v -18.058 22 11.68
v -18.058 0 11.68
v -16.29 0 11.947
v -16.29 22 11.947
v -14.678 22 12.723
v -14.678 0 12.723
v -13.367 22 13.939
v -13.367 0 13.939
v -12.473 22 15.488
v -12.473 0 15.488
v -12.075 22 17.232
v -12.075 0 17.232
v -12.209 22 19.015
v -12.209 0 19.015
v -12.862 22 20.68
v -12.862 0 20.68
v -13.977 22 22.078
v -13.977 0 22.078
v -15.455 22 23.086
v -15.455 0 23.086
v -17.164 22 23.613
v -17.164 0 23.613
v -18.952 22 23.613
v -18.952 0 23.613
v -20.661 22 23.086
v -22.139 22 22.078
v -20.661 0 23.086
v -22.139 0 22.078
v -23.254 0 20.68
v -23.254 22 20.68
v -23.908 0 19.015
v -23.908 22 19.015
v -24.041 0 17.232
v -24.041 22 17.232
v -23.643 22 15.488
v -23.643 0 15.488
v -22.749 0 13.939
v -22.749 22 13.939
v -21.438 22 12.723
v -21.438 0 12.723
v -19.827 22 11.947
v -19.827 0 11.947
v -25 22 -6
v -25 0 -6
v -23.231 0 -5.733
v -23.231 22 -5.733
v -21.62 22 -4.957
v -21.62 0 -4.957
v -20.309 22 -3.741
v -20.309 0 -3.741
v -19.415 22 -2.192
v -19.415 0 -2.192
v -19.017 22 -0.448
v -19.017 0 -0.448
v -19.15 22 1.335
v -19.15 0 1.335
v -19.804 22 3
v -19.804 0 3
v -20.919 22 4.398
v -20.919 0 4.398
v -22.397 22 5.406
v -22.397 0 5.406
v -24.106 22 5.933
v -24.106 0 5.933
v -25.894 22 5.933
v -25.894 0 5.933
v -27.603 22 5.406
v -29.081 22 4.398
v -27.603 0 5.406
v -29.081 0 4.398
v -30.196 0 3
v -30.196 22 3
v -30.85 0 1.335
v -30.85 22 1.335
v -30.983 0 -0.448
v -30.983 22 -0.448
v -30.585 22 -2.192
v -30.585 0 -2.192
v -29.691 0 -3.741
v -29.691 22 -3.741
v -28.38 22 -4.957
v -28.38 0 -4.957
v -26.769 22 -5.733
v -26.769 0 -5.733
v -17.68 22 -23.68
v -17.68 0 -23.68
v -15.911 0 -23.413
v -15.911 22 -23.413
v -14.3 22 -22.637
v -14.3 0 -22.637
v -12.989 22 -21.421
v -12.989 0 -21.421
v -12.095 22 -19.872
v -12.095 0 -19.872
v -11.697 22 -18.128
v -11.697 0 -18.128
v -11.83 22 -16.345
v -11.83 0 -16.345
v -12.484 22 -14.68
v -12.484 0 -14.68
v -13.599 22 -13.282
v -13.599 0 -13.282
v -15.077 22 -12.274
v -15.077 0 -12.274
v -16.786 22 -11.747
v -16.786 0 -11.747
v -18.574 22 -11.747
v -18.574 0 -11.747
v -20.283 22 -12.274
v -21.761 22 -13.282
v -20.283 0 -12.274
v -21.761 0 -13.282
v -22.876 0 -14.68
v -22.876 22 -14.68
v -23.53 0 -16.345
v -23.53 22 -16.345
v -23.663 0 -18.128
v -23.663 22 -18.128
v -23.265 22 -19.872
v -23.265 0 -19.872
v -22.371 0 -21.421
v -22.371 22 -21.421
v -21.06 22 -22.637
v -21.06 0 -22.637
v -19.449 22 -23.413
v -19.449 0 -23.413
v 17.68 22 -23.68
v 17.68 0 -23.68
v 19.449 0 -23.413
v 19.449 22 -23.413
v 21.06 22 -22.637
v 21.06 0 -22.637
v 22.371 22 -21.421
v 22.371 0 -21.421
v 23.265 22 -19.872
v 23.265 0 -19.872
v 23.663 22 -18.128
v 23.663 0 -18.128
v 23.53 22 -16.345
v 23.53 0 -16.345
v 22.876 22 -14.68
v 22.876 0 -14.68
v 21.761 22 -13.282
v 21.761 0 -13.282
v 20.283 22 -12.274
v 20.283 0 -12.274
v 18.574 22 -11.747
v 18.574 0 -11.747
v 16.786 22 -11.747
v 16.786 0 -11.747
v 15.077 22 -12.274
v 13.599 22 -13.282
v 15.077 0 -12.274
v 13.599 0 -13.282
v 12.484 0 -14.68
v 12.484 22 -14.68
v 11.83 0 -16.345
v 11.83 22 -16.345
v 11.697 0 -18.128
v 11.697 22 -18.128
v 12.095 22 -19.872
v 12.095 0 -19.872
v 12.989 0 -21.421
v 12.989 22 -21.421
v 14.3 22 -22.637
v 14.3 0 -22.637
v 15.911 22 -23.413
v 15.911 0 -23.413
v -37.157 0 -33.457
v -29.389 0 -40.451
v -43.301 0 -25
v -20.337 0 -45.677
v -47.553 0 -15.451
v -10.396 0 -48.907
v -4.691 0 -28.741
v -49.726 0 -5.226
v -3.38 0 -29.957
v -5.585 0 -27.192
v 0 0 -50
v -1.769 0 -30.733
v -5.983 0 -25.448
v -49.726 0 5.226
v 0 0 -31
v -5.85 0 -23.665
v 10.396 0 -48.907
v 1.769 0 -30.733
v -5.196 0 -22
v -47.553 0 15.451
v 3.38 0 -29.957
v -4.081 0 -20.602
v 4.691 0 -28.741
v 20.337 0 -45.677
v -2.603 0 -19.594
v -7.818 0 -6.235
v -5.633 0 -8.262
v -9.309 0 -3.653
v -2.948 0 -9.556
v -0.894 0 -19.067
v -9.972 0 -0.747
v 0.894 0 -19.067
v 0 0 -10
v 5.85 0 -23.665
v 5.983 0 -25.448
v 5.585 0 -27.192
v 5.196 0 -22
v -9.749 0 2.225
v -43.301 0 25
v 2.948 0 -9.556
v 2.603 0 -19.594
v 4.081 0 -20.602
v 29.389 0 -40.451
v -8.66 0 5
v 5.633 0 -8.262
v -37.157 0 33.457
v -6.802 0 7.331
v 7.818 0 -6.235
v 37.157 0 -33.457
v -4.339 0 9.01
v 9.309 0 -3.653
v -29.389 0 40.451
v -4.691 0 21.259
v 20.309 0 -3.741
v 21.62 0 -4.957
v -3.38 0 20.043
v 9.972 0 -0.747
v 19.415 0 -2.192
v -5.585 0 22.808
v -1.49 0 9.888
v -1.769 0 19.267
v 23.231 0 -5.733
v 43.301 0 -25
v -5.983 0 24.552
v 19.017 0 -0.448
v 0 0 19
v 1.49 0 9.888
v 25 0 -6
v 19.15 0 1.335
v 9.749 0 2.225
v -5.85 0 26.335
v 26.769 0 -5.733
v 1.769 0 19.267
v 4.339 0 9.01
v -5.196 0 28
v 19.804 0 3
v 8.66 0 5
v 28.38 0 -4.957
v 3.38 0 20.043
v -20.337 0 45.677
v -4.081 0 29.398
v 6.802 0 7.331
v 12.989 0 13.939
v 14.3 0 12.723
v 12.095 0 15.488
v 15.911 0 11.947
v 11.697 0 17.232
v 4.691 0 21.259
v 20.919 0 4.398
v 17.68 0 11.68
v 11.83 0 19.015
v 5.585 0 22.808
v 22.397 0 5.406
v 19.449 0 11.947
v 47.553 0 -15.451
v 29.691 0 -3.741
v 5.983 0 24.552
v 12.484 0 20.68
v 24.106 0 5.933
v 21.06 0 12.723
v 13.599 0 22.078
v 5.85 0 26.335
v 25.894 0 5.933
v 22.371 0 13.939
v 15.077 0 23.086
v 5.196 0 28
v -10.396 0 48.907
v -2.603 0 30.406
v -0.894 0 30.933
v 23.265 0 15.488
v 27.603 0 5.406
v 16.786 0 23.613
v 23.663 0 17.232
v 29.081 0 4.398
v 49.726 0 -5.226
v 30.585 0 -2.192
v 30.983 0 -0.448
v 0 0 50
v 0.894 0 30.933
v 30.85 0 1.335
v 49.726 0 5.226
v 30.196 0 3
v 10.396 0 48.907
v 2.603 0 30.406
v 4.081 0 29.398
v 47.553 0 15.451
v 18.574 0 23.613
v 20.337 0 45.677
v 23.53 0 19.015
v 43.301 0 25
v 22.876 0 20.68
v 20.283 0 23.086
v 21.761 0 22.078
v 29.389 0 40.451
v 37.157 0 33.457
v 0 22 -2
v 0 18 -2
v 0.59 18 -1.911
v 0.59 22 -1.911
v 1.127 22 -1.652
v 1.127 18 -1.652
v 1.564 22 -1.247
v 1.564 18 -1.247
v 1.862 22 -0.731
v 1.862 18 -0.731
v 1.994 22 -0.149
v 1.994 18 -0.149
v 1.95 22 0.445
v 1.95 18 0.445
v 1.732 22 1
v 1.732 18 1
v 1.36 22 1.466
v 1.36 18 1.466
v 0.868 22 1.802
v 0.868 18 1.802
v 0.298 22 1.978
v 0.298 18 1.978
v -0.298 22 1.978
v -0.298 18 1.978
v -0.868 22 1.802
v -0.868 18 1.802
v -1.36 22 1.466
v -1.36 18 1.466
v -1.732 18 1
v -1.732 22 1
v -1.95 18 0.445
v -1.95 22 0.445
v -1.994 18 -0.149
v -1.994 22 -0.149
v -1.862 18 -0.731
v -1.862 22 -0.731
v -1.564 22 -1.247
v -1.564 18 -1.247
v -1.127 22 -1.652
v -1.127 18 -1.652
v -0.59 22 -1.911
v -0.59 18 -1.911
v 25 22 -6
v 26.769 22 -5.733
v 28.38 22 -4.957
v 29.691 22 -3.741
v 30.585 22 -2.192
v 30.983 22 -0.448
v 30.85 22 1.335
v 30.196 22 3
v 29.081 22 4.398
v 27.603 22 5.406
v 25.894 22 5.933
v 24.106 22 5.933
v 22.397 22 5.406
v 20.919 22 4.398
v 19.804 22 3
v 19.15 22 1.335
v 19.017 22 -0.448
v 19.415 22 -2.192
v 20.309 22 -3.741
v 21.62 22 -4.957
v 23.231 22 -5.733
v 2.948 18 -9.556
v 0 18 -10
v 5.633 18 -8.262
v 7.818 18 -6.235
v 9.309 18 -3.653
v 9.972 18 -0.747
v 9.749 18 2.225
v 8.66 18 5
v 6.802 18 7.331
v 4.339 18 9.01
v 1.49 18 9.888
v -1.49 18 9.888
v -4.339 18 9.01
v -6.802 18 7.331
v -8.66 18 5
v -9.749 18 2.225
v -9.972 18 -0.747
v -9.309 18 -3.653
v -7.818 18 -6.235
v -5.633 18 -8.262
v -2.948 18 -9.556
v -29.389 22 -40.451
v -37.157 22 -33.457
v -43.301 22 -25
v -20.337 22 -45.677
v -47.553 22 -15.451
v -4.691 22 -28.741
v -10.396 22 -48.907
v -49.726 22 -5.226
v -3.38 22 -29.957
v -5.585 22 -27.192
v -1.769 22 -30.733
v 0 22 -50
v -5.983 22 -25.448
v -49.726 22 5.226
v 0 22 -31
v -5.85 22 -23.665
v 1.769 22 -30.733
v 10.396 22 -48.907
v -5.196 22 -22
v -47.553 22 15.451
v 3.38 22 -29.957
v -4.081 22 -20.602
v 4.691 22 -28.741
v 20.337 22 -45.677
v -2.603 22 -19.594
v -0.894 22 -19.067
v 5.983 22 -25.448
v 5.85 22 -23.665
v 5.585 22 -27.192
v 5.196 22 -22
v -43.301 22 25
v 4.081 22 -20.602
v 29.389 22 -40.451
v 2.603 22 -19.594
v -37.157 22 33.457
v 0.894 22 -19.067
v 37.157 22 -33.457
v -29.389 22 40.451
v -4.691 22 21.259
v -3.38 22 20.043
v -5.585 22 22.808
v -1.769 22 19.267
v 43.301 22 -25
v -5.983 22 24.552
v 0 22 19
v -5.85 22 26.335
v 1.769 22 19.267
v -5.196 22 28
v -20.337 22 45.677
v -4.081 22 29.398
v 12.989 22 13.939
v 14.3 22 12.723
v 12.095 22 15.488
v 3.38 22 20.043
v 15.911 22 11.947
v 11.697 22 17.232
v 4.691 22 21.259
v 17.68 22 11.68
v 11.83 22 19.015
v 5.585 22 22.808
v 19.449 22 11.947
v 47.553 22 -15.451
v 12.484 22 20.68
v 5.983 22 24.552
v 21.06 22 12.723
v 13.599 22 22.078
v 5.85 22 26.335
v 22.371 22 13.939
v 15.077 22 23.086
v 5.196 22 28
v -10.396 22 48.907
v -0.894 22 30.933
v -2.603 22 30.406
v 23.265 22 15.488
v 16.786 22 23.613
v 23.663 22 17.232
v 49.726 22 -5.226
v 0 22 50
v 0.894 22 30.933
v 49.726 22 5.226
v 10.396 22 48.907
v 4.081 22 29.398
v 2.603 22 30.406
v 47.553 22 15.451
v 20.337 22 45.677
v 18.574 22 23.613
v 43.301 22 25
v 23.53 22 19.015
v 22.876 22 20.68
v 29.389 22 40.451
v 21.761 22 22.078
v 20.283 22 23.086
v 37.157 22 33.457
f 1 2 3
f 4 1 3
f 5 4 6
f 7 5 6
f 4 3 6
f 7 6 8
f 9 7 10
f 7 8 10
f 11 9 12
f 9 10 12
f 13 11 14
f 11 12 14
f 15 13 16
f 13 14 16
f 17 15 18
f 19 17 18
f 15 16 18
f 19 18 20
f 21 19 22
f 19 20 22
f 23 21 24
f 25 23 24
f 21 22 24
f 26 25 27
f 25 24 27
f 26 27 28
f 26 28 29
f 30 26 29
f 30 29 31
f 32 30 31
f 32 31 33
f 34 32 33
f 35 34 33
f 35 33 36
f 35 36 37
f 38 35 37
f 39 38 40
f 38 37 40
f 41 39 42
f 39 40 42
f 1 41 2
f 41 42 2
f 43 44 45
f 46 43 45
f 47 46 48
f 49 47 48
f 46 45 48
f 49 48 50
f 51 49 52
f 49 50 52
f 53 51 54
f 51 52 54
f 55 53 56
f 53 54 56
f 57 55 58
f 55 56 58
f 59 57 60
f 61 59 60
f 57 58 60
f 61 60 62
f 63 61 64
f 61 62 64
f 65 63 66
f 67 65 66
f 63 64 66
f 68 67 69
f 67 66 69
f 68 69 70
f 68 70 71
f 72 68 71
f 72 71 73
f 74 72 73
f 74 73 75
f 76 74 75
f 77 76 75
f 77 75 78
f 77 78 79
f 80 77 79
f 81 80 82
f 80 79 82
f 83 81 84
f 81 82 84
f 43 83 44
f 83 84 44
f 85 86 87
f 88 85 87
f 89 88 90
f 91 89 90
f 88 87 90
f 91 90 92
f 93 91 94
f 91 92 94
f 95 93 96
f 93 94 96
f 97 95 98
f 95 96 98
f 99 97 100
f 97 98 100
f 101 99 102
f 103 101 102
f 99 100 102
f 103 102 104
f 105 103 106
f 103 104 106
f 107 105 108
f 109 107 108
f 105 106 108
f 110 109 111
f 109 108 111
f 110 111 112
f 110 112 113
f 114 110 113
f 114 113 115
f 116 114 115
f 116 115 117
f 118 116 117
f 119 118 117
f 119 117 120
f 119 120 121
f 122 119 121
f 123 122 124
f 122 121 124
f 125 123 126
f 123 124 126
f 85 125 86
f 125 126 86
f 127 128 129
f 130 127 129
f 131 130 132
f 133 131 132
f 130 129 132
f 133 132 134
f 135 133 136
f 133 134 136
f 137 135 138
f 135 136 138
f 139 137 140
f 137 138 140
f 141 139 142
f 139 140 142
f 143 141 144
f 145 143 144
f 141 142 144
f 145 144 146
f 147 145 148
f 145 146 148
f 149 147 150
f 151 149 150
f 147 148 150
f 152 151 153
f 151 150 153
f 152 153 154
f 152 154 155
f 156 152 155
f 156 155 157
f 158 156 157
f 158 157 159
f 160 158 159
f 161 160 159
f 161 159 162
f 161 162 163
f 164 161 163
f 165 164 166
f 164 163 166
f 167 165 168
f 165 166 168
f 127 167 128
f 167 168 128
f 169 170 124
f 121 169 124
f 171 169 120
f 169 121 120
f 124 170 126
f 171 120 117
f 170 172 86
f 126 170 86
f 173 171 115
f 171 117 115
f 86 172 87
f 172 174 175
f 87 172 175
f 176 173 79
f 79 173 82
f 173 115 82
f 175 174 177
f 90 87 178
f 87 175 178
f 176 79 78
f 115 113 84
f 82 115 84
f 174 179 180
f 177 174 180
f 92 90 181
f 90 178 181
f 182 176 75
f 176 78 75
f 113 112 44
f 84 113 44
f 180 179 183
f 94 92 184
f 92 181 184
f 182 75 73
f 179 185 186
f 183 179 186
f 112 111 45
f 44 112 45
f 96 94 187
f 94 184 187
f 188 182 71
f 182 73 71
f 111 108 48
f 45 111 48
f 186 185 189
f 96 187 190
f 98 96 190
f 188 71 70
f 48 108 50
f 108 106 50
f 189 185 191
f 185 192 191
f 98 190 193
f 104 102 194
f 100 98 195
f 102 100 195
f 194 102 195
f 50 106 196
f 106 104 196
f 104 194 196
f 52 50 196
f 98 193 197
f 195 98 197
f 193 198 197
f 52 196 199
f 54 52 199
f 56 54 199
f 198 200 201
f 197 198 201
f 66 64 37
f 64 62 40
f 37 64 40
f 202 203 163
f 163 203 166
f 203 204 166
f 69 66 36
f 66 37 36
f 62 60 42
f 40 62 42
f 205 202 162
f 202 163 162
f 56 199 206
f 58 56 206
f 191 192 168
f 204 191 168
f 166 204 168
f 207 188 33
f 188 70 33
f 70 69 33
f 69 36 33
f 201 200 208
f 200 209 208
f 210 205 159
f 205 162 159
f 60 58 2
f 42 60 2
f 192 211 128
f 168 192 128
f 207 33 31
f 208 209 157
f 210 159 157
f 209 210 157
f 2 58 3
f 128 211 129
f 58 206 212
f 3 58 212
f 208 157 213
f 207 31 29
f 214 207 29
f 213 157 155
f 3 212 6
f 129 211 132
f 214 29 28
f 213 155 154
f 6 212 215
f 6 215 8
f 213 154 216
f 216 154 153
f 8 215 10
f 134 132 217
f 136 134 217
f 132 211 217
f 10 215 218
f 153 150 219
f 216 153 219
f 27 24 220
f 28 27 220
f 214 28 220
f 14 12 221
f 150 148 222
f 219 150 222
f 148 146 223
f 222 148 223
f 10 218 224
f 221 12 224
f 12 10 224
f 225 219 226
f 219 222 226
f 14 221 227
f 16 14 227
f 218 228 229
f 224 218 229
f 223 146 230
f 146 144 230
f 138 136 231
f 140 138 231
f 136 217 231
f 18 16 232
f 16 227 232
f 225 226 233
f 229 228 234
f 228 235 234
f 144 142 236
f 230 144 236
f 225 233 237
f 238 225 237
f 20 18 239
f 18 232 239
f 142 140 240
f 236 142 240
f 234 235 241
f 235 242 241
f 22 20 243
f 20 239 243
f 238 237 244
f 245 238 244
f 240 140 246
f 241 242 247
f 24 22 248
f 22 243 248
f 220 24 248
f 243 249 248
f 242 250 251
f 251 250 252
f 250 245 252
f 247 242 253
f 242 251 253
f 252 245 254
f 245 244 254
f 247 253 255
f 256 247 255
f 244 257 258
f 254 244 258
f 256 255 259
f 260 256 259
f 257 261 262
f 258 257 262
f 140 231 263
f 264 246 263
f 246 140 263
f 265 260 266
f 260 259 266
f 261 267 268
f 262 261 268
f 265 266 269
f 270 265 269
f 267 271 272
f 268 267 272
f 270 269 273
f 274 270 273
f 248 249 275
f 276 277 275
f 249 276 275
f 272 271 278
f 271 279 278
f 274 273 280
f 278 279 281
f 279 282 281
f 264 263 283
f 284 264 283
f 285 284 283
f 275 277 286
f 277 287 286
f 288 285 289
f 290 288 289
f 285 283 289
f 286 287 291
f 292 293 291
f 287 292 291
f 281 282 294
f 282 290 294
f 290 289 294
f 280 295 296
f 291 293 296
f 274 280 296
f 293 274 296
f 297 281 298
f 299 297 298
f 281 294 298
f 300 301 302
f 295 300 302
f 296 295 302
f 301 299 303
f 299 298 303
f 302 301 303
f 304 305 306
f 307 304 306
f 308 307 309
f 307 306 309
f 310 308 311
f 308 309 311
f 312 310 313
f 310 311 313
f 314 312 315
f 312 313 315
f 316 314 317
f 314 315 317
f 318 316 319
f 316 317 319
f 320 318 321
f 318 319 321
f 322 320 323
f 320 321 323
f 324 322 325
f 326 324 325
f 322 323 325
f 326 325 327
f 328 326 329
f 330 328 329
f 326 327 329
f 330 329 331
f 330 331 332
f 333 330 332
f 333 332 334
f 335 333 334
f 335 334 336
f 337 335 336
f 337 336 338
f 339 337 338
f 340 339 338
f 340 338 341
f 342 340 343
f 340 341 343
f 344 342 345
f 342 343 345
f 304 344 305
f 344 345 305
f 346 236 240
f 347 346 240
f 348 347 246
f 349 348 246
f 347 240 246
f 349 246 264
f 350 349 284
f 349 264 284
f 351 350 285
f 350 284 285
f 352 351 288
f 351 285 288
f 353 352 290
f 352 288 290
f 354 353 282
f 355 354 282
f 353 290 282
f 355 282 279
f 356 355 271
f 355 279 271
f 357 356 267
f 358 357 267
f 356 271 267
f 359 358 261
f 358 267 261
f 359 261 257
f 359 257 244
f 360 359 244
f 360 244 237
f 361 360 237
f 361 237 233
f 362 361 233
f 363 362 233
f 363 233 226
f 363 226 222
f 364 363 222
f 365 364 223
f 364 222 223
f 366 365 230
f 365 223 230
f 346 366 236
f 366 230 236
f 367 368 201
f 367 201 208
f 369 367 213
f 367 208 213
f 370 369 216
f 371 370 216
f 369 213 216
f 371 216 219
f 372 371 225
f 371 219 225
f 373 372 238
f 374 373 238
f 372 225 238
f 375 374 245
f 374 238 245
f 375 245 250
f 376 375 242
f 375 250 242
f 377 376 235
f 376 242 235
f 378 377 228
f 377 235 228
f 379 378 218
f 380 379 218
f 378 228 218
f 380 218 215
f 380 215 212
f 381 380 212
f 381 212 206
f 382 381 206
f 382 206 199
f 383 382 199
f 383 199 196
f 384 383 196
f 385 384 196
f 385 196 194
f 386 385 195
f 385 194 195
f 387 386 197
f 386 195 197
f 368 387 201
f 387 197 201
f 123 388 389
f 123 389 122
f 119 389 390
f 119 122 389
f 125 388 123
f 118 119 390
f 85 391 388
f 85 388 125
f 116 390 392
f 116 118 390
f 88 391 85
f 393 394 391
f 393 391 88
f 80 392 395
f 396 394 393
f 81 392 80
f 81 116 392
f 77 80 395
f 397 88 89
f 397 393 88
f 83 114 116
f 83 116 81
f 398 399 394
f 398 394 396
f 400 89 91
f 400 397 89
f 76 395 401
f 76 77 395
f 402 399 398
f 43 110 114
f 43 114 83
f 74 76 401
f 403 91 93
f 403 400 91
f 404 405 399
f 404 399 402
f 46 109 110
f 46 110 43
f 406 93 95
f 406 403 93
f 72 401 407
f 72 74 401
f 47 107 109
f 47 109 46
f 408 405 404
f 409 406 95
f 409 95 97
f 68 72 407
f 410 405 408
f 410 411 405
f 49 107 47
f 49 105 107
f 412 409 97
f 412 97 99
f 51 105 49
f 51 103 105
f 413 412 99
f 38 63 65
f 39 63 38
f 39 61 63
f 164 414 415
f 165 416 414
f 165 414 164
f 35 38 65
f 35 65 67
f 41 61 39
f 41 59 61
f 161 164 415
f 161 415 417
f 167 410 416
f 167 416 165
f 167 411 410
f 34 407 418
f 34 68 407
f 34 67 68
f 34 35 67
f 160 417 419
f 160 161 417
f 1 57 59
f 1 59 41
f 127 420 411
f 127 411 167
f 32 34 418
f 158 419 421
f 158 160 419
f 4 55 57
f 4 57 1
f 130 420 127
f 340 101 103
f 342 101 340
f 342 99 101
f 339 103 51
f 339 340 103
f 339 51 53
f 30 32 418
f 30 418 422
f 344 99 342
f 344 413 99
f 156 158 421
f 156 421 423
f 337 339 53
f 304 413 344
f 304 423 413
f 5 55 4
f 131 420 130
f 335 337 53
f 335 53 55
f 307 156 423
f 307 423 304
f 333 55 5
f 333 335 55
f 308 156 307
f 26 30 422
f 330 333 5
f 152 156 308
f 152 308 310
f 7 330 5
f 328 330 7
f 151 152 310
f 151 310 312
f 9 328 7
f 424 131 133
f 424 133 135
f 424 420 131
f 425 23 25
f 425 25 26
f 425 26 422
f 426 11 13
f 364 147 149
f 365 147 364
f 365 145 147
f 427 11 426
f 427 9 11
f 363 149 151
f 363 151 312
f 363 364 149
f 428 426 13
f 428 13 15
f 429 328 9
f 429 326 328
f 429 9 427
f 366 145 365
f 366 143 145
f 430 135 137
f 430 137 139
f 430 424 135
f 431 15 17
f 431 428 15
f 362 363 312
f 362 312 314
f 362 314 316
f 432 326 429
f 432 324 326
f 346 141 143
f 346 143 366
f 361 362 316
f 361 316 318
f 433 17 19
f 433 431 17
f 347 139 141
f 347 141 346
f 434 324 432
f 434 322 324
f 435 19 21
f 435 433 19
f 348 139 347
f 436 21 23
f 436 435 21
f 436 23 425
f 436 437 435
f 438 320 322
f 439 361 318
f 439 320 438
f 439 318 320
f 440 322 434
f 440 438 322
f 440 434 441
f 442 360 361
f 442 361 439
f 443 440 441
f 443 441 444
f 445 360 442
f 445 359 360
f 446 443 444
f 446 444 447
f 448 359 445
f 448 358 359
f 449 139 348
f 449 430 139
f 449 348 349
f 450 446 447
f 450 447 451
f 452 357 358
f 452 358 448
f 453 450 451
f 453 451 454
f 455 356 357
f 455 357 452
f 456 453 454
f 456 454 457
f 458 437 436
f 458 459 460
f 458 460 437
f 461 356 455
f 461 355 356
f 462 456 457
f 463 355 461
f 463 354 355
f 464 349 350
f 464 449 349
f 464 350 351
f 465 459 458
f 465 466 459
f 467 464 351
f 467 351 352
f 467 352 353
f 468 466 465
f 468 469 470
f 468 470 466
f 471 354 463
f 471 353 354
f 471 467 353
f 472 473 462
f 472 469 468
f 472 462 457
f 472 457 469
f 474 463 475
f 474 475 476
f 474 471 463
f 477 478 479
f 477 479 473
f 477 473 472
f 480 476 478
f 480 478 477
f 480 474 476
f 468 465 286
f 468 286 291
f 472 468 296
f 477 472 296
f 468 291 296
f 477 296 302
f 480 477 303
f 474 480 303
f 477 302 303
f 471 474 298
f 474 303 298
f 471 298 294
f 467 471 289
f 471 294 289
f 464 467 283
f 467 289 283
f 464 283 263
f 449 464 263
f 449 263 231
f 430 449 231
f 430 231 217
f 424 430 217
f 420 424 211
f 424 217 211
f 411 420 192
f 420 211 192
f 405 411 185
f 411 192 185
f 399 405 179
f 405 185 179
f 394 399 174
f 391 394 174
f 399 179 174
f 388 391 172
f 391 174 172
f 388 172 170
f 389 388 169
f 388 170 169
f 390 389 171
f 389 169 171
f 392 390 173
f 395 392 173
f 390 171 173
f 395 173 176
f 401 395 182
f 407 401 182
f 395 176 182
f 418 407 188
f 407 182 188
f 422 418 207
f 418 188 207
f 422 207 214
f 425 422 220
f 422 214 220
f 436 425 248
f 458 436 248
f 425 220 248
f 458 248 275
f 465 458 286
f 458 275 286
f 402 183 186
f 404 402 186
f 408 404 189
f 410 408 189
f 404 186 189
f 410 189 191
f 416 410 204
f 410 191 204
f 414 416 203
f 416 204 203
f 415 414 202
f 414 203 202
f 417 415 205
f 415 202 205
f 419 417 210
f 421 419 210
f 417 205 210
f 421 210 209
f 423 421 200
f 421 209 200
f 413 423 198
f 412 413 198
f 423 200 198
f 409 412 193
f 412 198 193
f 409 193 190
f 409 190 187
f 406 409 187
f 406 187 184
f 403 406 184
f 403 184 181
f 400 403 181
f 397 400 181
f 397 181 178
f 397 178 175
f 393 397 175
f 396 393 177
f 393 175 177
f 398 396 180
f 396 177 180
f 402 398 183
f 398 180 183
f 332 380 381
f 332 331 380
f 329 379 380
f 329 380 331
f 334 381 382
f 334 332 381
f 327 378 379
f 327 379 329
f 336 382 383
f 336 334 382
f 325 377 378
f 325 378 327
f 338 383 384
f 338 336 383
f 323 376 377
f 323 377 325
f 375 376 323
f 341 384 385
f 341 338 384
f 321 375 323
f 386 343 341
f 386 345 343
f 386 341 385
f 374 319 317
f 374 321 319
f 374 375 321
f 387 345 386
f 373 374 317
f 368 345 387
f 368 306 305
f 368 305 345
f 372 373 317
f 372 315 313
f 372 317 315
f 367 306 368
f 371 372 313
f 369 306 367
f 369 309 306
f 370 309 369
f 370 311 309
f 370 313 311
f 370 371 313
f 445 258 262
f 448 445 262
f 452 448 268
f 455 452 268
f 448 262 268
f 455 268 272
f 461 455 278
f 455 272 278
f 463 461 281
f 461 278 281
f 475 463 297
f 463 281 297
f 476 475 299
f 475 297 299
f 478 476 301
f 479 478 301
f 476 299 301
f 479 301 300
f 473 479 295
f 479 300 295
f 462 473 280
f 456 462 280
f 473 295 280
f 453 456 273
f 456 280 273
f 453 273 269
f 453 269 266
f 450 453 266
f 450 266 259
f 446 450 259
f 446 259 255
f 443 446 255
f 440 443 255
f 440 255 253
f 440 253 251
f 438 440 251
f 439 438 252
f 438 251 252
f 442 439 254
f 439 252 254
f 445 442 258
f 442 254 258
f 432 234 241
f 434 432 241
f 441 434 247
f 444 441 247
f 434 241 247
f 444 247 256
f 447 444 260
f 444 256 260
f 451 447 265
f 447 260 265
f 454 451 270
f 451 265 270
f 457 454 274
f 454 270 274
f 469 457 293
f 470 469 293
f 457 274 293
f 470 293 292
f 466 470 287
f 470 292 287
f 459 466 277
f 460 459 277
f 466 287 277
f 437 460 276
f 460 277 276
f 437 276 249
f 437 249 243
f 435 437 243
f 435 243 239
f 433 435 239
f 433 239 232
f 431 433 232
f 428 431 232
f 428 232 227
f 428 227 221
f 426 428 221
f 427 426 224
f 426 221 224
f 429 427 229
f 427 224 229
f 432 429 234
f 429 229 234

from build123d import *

# Parameters (mm, degrees)
ESQUISSE1_R              = 50
BOSS_EXTRU_1_DEPTH       = 22
ESQUISSE5_R              = 6
ENL_V_MAT_EXTRU_6_DEPTH  = 22
ESQUISSE7_R              = 6
ENL_V_MAT_EXTRU_7_DEPTH  = 22
ESQUISSE8_R              = 6
ENL_V_MAT_EXTRU_8_DEPTH  = 22
ESQUISSE9_R              = 6
ENL_V_MAT_EXTRU_9_DEPTH  = 22
ESQUISSE10_R             = 6
ENL_V_MAT_EXTRU_10_DEPTH = 22
ESQUISSE11_R             = 6
ENL_V_MAT_EXTRU_11_DEPTH = 22
ESQUISSE12_R             = 6
ENL_V_MAT_EXTRU_12_DEPTH = 22
ESQUISSE13_R             = 6
ENL_V_MAT_EXTRU_13_DEPTH = 22
ESQUISSE14_R             = 10
ENL_V_MAT_EXTRU_15_DEPTH = 18
ESQUISSE15_R             = 2
ENL_V_MAT_EXTRU_16_DEPTH = 4


with BuildPart() as part:
    # Esquisse1 → Boss.-Extru.1 (new body)
    with BuildSketch(Plane(origin=(0, 0, 0), x_dir=(1, 0, 0), z_dir=(0, 1, 0))):
        with Locations(Location((0, 0, 0), (0, 0, 270))):
            Circle(ESQUISSE1_R)
    extrude(amount=BOSS_EXTRU_1_DEPTH)

    # Esquisse5 → Enlèv. mat.-Extru.6 (cut)
    with BuildSketch(Plane(origin=(0, 0, 0), x_dir=(-1, 0, 0), z_dir=(0, -1, 0))):
        with Locations(Location((-17.68, 17.68, 0), (0, 0, 90))):
            Circle(ESQUISSE5_R)
    extrude(amount=-ENL_V_MAT_EXTRU_6_DEPTH, mode=Mode.SUBTRACT)

    # Esquisse7 → Enlèv. mat.-Extru.7 (cut)
    with BuildSketch(Plane(origin=(0, 0, 0), x_dir=(-1, 0, 0), z_dir=(0, -1, 0))):
        with Locations(Location((18.058126749, -17.68, 0), (0, 0, 90))):
            Circle(ESQUISSE7_R)
    extrude(amount=-ENL_V_MAT_EXTRU_7_DEPTH, mode=Mode.SUBTRACT)

    # Esquisse8 → Enlèv. mat.-Extru.8 (cut)
    with BuildSketch(Plane(origin=(0, 0, 0), x_dir=(-1, 0, 0), z_dir=(0, -1, 0))):
        with Locations(Location((17.68, 17.68, 0), (0, 0, 90))):
            Circle(ESQUISSE8_R)
    extrude(amount=-ENL_V_MAT_EXTRU_8_DEPTH, mode=Mode.SUBTRACT)

    # Esquisse9 → Enlèv. mat.-Extru.9 (cut)
    with BuildSketch(Plane(origin=(0, 0, 0), x_dir=(-1, 0, 0), z_dir=(0, -1, 0))):
        with Locations(Location((-17.68, -17.68, 0), (0, 0, 90))):
            Circle(ESQUISSE9_R)
    extrude(amount=-ENL_V_MAT_EXTRU_9_DEPTH, mode=Mode.SUBTRACT)

    # Esquisse10 → Enlèv. mat.-Extru.10 (cut)
    with BuildSketch(Plane.XZ):
        with Locations(Location((0, 25, 0), (0, 0, 270))):
            Circle(ESQUISSE10_R)
    extrude(amount=-ENL_V_MAT_EXTRU_10_DEPTH, mode=Mode.SUBTRACT)

    # Esquisse11 → Enlèv. mat.-Extru.11 (cut)
    with BuildSketch(Plane(origin=(0, 0, 0), x_dir=(-1, 0, 0), z_dir=(0, -1, 0))):
        with Locations(Location((25, 0, 0), (0, 0, 90))):
            Circle(ESQUISSE11_R)
    extrude(amount=-ENL_V_MAT_EXTRU_11_DEPTH, mode=Mode.SUBTRACT)

    # Esquisse12 → Enlèv. mat.-Extru.12 (cut)
    with BuildSketch(Plane(origin=(0, 0, 0), x_dir=(-1, 0, 0), z_dir=(0, -1, 0))):
        with Locations(Location((-25, 0, 0), (0, 0, 90))):
            Circle(ESQUISSE12_R)
    extrude(amount=-ENL_V_MAT_EXTRU_12_DEPTH, mode=Mode.SUBTRACT)

    # Esquisse13 → Enlèv. mat.-Extru.13 (cut)
    with BuildSketch(Plane(origin=(0, 0, 0), x_dir=(-1, 0, 0), z_dir=(0, -1, 0))):
        with Locations(Location((0, 25, 0), (0, 0, 90))):
            Circle(ESQUISSE13_R)
    extrude(amount=-ENL_V_MAT_EXTRU_13_DEPTH, mode=Mode.SUBTRACT)

    # Esquisse14 → Enlèv. mat.-Extru.15 (cut)
    with BuildSketch(Plane(origin=(0, 0, 0), x_dir=(-1, 0, 0), z_dir=(0, -1, 0))):
        with Locations(Location((0, 0, 0), (0, 0, 90))):
            Circle(ESQUISSE14_R)
    extrude(amount=-ENL_V_MAT_EXTRU_15_DEPTH, mode=Mode.SUBTRACT)

    # Esquisse15 → Enlèv. mat.-Extru.16 (cut)
    with BuildSketch(Plane(origin=(0, 18, 0), x_dir=(-1, 0, 0), z_dir=(0, -1, 0))):
        with Locations(Location((0, 0, 0), (0, 0, 90))):
            Circle(ESQUISSE15_R)
    extrude(amount=-ENL_V_MAT_EXTRU_16_DEPTH, mode=Mode.SUBTRACT)


solid = part.part
